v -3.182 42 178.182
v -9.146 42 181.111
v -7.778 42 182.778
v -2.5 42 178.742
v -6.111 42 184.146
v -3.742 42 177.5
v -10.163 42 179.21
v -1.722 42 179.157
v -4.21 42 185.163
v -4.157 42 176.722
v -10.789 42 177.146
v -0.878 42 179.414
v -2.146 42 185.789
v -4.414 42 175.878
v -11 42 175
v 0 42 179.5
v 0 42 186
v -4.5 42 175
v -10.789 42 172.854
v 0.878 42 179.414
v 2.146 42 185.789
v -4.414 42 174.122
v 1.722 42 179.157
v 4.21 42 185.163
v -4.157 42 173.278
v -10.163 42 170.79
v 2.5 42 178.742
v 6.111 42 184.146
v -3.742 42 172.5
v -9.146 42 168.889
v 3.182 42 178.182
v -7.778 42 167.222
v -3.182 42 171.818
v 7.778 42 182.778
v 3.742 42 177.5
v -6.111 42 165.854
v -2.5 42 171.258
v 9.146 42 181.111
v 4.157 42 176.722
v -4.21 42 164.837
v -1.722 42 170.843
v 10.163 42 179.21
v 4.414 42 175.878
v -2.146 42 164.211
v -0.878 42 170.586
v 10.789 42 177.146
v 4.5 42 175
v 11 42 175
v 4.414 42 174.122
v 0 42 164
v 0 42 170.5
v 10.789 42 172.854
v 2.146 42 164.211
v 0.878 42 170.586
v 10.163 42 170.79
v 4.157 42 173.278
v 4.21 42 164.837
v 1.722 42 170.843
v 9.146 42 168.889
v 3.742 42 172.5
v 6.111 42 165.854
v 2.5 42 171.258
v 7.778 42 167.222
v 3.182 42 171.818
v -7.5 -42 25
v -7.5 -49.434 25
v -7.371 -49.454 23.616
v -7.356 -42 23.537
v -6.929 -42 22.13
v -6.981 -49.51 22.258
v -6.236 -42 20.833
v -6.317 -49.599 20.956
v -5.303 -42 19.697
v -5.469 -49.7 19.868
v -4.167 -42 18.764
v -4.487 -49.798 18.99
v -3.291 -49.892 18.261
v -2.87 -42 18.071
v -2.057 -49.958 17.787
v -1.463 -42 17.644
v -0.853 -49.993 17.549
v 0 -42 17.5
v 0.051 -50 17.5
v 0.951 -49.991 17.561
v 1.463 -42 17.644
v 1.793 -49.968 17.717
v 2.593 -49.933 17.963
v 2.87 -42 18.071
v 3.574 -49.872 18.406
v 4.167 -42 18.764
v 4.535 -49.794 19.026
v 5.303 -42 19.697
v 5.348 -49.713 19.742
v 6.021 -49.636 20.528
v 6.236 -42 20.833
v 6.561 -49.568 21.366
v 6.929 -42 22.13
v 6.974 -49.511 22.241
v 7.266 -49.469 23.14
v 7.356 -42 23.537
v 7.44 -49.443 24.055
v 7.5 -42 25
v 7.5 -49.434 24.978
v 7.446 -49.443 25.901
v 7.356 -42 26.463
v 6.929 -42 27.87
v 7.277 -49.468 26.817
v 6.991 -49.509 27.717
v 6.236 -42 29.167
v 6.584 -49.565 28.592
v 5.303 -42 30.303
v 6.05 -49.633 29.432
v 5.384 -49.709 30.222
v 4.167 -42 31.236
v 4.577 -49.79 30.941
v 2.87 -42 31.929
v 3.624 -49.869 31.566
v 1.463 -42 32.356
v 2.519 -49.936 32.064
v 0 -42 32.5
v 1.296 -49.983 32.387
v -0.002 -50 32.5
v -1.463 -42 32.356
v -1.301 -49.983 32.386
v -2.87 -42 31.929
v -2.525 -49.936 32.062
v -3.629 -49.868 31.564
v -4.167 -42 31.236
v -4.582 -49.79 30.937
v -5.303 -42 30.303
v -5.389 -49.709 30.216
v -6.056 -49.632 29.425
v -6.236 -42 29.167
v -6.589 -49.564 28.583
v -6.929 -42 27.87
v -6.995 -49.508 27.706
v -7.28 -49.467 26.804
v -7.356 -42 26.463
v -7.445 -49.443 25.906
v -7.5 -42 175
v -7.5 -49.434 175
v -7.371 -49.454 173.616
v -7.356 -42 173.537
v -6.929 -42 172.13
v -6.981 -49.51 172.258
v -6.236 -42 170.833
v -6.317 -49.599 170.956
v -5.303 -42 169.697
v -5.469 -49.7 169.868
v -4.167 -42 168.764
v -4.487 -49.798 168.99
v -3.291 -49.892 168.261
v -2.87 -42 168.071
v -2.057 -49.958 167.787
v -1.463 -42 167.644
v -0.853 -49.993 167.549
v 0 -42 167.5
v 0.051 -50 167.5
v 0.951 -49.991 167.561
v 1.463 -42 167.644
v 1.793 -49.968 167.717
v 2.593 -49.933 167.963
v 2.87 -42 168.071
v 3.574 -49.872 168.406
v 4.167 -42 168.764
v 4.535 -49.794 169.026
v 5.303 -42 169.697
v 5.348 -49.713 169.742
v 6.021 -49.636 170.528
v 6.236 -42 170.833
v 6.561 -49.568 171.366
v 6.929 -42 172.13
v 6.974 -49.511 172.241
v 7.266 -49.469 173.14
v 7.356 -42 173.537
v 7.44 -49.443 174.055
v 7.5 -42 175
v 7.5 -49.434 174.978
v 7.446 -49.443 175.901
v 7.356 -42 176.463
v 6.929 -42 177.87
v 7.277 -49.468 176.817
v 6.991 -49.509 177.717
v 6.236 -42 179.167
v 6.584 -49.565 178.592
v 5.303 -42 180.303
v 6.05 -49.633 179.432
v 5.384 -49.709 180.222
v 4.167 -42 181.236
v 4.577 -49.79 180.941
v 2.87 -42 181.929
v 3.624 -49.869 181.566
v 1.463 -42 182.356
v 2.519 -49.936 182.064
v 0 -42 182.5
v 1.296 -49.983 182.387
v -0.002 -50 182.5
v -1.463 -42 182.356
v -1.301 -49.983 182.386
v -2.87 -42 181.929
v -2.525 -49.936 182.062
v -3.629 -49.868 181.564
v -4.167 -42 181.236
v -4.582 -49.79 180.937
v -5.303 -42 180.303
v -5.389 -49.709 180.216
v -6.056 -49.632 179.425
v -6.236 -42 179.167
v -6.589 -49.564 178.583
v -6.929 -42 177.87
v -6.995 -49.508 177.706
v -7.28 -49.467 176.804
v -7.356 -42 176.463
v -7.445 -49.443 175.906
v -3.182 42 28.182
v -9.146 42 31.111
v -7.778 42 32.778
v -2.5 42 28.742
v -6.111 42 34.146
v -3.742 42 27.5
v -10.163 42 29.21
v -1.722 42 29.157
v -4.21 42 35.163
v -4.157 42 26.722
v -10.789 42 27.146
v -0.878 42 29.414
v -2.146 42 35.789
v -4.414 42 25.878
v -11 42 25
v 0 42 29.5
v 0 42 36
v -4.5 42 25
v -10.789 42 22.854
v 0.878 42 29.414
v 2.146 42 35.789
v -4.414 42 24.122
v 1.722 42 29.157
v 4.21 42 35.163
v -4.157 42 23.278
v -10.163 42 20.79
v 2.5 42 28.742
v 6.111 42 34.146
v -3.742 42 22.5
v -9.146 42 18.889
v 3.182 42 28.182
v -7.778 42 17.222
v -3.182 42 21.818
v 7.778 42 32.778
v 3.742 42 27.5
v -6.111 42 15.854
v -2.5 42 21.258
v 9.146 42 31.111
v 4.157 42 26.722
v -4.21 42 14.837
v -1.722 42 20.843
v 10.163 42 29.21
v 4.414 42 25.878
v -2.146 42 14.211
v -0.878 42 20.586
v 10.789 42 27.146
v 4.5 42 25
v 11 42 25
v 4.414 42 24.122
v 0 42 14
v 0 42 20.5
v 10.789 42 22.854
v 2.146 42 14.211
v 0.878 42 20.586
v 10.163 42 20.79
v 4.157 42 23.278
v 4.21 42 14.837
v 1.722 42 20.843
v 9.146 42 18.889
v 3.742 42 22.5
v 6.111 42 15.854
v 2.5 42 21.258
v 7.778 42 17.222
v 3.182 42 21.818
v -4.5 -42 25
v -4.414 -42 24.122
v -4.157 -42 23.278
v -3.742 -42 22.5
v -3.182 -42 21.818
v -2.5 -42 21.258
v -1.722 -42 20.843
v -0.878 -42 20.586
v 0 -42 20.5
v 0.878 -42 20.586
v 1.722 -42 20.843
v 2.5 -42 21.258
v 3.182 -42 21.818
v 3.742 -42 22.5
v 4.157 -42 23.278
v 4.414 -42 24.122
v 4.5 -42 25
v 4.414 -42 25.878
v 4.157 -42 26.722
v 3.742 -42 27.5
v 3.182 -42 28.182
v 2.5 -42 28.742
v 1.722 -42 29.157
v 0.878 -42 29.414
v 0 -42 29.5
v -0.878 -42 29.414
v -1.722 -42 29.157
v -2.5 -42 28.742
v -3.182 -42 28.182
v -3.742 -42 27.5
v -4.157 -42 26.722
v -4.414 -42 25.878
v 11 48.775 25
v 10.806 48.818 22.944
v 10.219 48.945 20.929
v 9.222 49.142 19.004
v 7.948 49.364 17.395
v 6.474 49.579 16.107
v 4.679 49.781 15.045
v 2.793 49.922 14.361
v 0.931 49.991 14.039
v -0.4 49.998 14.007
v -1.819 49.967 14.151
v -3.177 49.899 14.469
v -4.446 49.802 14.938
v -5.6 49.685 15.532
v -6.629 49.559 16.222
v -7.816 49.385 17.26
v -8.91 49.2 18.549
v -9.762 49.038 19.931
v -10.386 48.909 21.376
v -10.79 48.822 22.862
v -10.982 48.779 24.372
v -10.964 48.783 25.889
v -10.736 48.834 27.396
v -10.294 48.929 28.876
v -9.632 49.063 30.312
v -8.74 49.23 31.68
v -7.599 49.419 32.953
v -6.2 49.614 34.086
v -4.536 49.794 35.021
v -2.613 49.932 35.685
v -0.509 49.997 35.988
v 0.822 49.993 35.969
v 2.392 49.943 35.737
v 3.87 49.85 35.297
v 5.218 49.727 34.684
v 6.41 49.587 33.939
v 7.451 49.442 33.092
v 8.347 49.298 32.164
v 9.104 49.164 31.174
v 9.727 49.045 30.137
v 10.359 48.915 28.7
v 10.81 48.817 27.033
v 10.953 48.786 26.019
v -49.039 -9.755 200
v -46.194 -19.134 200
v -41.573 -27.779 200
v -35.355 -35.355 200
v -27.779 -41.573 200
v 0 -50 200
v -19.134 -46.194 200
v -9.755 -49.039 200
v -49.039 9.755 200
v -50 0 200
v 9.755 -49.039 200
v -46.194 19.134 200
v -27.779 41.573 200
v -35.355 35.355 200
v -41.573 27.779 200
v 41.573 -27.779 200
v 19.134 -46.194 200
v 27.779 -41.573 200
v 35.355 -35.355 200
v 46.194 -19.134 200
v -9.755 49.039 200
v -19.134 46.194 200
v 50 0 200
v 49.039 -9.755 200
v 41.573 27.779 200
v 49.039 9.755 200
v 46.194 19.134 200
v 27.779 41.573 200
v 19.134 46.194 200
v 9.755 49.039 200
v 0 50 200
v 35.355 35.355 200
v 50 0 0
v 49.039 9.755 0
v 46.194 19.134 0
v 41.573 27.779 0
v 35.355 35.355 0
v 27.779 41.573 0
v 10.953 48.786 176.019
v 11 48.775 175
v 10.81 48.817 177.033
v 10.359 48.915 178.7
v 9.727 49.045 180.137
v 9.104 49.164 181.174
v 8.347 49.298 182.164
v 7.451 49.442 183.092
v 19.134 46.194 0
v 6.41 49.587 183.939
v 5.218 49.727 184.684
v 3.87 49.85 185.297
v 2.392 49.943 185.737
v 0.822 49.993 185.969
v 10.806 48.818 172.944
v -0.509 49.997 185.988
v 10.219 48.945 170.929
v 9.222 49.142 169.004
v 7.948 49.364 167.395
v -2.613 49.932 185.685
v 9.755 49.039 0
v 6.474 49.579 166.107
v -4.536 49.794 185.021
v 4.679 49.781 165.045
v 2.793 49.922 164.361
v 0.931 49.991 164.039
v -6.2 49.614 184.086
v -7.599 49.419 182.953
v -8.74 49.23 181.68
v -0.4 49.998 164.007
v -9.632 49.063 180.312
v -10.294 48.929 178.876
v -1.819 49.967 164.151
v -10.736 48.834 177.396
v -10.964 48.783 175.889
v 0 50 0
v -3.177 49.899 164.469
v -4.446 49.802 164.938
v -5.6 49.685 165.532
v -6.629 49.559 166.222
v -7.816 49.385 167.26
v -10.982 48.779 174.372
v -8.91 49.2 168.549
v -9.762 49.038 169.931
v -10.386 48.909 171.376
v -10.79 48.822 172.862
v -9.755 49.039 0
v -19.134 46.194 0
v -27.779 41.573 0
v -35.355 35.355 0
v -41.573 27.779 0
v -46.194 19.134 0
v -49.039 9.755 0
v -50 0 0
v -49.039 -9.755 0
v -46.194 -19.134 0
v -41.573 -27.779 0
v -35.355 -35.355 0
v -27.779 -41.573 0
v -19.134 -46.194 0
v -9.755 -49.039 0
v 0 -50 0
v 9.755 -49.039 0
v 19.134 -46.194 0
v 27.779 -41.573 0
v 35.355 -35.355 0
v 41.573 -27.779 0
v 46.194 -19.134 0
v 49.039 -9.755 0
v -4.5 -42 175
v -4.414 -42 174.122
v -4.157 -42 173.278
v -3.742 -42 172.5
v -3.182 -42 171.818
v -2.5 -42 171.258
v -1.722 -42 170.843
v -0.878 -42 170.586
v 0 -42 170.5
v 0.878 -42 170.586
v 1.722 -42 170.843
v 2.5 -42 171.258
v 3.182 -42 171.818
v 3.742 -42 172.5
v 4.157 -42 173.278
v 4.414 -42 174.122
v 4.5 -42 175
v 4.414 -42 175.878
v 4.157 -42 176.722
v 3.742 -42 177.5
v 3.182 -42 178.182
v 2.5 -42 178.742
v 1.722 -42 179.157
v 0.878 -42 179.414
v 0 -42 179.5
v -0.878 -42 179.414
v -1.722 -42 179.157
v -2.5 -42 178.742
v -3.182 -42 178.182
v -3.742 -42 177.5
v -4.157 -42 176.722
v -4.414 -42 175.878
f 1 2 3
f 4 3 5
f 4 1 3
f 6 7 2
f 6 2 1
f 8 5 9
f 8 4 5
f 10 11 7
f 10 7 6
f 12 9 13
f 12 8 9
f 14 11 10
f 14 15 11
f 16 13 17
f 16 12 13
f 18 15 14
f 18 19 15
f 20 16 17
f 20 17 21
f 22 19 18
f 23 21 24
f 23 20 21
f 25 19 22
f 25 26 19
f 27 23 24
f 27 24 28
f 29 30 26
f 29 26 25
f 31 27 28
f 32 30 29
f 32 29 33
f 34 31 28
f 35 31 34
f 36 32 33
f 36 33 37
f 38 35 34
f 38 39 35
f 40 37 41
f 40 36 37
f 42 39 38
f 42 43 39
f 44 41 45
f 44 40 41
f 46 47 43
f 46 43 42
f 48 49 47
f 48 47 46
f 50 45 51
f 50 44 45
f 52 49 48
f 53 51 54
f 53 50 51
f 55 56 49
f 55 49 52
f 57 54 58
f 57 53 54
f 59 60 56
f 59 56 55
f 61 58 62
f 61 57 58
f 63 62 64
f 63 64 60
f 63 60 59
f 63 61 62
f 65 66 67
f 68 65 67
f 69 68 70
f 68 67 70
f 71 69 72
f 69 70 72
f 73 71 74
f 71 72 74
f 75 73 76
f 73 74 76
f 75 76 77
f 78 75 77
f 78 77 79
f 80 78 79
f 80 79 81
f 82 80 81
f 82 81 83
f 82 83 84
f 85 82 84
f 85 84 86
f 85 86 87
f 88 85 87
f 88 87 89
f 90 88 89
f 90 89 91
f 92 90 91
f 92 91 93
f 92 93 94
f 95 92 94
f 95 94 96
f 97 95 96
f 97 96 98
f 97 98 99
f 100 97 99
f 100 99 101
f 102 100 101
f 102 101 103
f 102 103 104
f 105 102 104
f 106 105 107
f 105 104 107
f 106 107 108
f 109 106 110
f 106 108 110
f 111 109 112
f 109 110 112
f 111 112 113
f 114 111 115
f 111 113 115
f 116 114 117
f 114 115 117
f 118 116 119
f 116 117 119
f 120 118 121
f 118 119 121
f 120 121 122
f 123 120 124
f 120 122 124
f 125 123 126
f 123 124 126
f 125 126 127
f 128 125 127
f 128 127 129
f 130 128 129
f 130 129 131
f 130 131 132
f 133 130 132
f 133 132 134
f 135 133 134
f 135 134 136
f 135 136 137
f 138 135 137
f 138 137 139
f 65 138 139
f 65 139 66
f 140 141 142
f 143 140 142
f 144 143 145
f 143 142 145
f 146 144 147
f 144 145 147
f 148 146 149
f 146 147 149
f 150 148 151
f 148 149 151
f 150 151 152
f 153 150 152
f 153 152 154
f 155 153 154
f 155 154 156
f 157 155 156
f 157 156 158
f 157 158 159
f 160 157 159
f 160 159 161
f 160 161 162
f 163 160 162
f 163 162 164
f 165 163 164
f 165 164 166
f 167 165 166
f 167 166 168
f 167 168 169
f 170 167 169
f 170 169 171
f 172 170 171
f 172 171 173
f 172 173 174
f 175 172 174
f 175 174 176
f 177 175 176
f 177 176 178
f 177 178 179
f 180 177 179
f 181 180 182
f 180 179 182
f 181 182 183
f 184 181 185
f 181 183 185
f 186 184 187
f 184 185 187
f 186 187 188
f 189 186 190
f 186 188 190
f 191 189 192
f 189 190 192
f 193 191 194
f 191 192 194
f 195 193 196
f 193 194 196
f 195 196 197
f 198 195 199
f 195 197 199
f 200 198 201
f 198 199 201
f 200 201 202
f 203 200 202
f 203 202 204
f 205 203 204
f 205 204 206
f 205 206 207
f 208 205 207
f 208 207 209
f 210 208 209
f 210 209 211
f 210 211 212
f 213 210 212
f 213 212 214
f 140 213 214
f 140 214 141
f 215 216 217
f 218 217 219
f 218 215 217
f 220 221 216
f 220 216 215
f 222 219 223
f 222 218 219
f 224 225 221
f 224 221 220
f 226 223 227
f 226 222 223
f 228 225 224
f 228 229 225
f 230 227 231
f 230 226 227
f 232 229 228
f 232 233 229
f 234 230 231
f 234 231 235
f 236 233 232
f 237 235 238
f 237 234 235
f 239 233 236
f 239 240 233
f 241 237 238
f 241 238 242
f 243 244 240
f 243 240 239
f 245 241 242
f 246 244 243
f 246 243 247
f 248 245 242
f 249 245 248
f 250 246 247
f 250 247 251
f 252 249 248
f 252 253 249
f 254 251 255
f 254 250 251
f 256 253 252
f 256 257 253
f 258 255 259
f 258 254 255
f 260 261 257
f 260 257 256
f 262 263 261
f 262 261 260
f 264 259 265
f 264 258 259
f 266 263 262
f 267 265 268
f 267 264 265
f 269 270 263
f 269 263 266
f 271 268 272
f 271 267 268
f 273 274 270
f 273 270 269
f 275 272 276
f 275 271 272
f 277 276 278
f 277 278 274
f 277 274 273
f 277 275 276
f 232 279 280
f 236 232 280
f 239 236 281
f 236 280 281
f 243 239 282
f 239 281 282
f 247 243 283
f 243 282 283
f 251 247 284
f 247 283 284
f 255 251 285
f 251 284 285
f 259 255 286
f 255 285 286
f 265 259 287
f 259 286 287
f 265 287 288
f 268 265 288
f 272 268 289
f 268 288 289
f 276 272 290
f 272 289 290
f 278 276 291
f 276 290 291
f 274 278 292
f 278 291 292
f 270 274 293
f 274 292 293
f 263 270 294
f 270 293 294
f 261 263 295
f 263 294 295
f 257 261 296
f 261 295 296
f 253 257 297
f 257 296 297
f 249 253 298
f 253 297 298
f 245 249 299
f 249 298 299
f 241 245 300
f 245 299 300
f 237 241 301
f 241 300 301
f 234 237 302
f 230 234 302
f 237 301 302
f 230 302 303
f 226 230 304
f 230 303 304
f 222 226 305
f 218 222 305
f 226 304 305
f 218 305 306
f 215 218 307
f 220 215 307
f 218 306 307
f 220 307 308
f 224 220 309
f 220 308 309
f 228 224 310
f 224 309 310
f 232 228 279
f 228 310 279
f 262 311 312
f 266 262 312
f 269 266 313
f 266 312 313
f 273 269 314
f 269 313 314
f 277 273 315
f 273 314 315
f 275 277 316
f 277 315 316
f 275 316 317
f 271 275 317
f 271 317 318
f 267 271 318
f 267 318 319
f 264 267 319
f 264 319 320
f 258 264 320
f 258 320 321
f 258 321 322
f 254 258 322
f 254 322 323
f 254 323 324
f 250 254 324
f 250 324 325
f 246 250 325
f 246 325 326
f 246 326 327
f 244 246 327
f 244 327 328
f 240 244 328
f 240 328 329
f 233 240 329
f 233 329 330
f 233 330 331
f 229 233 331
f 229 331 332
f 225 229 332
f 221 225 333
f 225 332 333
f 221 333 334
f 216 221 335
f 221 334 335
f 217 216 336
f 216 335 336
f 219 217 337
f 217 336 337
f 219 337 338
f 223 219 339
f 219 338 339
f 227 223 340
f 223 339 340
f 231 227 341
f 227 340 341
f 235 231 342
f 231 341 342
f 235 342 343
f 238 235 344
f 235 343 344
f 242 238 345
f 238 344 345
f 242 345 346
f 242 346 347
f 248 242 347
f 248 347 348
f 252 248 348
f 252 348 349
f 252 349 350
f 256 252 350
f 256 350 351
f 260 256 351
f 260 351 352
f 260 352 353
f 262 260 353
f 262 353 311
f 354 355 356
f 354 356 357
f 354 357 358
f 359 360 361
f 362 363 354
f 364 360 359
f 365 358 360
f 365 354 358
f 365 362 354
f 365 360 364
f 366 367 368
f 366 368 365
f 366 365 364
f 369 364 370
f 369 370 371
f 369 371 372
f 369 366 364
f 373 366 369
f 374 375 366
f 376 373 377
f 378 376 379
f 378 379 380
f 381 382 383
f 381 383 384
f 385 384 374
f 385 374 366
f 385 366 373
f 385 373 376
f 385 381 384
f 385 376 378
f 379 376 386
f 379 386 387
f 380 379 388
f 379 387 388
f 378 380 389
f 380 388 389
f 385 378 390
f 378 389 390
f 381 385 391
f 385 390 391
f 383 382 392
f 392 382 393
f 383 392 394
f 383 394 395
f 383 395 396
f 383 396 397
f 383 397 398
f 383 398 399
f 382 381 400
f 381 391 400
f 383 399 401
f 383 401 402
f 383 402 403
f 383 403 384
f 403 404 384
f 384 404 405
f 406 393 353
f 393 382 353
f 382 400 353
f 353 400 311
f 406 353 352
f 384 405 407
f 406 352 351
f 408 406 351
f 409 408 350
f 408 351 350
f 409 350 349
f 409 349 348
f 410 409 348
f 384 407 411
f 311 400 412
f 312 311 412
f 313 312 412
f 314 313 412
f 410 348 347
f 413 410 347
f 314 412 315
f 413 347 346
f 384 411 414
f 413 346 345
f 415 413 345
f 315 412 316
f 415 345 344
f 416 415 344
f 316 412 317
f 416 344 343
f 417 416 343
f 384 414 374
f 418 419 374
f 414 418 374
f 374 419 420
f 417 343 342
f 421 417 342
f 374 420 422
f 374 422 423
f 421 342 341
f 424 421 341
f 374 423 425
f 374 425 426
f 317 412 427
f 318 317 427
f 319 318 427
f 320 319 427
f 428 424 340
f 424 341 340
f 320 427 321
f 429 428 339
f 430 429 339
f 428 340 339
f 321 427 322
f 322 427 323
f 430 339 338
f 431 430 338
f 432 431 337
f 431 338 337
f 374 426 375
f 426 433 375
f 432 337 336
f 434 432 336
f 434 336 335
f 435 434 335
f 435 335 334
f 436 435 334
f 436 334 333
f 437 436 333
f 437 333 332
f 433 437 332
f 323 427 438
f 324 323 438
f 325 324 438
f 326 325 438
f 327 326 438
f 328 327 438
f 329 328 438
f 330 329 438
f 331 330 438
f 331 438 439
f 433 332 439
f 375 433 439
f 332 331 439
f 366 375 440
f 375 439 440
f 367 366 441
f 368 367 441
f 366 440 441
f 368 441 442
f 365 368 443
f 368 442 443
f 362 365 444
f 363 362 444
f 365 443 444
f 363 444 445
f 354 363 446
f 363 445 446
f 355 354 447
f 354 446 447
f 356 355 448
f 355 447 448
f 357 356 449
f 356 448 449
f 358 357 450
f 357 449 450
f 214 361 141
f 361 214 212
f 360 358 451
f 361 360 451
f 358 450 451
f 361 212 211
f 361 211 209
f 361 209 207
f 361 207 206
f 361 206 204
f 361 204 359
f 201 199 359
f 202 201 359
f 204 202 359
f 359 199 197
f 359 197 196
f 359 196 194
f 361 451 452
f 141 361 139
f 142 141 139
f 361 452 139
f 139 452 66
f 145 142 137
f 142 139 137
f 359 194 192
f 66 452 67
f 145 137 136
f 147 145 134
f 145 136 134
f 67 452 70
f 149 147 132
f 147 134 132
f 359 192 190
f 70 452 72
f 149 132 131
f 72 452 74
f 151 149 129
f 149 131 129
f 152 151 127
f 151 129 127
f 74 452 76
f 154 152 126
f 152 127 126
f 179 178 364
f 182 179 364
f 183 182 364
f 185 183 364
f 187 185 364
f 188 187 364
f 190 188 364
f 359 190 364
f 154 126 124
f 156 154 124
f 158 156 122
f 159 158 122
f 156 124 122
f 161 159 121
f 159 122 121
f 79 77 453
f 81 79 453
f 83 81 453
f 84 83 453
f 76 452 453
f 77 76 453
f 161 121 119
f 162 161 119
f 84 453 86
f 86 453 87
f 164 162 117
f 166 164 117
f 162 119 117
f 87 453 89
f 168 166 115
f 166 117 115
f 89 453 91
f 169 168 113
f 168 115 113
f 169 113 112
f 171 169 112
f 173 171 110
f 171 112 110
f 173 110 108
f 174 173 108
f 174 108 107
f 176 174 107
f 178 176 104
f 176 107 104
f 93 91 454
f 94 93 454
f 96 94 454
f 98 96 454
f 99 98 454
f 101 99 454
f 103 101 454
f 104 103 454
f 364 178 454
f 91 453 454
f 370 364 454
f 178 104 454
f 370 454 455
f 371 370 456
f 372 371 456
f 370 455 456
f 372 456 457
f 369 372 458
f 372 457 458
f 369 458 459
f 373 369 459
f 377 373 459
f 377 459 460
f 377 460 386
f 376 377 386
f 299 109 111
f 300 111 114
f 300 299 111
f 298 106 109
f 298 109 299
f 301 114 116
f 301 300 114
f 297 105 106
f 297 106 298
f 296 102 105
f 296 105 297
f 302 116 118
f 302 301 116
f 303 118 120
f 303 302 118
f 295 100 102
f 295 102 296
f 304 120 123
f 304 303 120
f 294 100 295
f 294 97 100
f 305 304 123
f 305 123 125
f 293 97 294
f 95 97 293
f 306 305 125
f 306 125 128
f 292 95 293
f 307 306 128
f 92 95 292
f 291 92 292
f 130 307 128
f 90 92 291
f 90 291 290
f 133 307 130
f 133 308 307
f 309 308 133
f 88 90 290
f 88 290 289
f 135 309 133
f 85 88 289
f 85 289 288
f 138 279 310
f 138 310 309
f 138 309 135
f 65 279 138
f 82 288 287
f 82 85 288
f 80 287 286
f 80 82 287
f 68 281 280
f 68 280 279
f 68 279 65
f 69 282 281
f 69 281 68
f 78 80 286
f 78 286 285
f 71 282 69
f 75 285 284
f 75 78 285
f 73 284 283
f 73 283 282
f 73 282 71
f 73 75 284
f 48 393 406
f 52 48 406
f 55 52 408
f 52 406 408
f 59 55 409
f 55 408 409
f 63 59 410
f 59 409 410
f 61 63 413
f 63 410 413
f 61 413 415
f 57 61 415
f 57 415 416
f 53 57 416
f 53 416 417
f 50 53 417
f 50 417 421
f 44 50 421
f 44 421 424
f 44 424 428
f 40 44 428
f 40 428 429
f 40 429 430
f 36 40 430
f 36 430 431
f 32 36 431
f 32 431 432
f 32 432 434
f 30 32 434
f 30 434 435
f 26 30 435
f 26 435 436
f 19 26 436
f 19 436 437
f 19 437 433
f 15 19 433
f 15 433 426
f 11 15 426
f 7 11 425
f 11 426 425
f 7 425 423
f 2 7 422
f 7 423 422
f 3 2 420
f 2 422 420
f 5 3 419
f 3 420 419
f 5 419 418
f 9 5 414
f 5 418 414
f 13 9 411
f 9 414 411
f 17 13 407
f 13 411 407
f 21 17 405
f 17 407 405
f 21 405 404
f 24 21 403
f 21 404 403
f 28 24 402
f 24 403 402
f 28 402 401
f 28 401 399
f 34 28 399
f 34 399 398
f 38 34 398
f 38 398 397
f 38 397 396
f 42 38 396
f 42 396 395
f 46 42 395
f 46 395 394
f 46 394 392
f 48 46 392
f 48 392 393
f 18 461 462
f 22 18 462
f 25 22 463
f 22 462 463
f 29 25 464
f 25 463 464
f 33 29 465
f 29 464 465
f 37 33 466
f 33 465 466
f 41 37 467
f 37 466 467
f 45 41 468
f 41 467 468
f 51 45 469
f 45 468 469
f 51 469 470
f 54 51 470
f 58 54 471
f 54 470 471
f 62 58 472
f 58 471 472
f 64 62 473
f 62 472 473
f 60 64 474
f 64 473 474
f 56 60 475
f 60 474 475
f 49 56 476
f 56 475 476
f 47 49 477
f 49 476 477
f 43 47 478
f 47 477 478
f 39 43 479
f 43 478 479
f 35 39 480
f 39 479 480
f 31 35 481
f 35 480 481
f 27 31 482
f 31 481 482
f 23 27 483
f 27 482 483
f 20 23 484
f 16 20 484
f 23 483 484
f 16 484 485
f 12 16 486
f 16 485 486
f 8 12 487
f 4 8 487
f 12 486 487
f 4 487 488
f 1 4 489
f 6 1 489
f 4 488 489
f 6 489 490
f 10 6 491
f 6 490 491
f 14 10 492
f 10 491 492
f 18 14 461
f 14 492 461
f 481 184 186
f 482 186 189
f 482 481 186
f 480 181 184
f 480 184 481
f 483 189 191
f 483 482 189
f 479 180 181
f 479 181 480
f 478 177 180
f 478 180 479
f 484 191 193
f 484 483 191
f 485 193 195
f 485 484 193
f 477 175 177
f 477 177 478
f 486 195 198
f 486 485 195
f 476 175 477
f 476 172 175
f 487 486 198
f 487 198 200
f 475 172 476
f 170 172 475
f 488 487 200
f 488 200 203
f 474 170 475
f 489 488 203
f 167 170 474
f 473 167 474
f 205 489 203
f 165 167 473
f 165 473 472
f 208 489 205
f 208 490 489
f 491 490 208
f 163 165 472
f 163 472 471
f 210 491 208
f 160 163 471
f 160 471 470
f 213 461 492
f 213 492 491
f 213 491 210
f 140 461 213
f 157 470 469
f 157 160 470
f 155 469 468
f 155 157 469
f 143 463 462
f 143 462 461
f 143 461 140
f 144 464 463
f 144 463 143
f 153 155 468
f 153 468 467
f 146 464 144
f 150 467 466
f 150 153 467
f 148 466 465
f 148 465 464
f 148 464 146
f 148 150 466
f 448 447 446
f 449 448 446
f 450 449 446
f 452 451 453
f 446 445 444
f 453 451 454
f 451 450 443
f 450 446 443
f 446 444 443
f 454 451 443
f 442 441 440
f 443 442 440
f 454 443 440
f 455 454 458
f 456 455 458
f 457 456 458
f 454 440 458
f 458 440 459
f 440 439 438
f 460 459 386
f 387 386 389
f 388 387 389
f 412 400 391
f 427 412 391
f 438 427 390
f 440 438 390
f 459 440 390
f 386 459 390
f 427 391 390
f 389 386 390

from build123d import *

# Parameters (mm, degrees)
SKIZZE1_R                                           = 50
AUFSATZ_LINEAR_AUSTRAGEN1_DEPTH                     = 200
STIRNSENKUNG_F_R_M8_SENKSCHRAUBE_KOPF_B_D           = 9
STIRNSENKUNG_F_R_M8_SENKSCHRAUBE_KOPF_B_CBORE_D     = 22
STIRNSENKUNG_F_R_M8_SENKSCHRAUBE_KOPF_B_CBORE_DEPTH = 8
STIRNSENKUNG_F_R_M8_SENKSCHRAUBE_KO_2_D             = 9
STIRNSENKUNG_F_R_M8_SENKSCHRAUBE_KO_2_CBORE_D       = 15
STIRNSENKUNG_F_R_M8_SENKSCHRAUBE_KO_2_CBORE_DEPTH   = 8


with BuildPart() as part:
    # Skizze1 → Aufsatz-Linear austragen1 (new body)
    with BuildSketch(Plane.XY):
        Circle(SKIZZE1_R)
    extrude(amount=AUFSATZ_LINEAR_AUSTRAGEN1_DEPTH)

    # Stirnsenkung f_r M8 Senkschraube _Kopf B (through all)
    with Locations(Plane(origin=(0, 50, 0), x_dir=(1, 0, 0), z_dir=(0, 1, 0))):
        with Locations((0, -25), (0, -175)):
            CounterBoreHole(STIRNSENKUNG_F_R_M8_SENKSCHRAUBE_KOPF_B_D / 2, STIRNSENKUNG_F_R_M8_SENKSCHRAUBE_KOPF_B_CBORE_D / 2, STIRNSENKUNG_F_R_M8_SENKSCHRAUBE_KOPF_B_CBORE_DEPTH)

    # Stirnsenkung f_r M8 Senkschraube _Ko 2 (through all)
    with Locations(Plane(origin=(0, -50, 0), x_dir=(-1, 0, 0), z_dir=(0, -1, 0))):
        with Locations((0, -175), (0, -25)):
            CounterBoreHole(STIRNSENKUNG_F_R_M8_SENKSCHRAUBE_KO_2_D / 2, STIRNSENKUNG_F_R_M8_SENKSCHRAUBE_KO_2_CBORE_D / 2, STIRNSENKUNG_F_R_M8_SENKSCHRAUBE_KO_2_CBORE_DEPTH)


solid = part.part
